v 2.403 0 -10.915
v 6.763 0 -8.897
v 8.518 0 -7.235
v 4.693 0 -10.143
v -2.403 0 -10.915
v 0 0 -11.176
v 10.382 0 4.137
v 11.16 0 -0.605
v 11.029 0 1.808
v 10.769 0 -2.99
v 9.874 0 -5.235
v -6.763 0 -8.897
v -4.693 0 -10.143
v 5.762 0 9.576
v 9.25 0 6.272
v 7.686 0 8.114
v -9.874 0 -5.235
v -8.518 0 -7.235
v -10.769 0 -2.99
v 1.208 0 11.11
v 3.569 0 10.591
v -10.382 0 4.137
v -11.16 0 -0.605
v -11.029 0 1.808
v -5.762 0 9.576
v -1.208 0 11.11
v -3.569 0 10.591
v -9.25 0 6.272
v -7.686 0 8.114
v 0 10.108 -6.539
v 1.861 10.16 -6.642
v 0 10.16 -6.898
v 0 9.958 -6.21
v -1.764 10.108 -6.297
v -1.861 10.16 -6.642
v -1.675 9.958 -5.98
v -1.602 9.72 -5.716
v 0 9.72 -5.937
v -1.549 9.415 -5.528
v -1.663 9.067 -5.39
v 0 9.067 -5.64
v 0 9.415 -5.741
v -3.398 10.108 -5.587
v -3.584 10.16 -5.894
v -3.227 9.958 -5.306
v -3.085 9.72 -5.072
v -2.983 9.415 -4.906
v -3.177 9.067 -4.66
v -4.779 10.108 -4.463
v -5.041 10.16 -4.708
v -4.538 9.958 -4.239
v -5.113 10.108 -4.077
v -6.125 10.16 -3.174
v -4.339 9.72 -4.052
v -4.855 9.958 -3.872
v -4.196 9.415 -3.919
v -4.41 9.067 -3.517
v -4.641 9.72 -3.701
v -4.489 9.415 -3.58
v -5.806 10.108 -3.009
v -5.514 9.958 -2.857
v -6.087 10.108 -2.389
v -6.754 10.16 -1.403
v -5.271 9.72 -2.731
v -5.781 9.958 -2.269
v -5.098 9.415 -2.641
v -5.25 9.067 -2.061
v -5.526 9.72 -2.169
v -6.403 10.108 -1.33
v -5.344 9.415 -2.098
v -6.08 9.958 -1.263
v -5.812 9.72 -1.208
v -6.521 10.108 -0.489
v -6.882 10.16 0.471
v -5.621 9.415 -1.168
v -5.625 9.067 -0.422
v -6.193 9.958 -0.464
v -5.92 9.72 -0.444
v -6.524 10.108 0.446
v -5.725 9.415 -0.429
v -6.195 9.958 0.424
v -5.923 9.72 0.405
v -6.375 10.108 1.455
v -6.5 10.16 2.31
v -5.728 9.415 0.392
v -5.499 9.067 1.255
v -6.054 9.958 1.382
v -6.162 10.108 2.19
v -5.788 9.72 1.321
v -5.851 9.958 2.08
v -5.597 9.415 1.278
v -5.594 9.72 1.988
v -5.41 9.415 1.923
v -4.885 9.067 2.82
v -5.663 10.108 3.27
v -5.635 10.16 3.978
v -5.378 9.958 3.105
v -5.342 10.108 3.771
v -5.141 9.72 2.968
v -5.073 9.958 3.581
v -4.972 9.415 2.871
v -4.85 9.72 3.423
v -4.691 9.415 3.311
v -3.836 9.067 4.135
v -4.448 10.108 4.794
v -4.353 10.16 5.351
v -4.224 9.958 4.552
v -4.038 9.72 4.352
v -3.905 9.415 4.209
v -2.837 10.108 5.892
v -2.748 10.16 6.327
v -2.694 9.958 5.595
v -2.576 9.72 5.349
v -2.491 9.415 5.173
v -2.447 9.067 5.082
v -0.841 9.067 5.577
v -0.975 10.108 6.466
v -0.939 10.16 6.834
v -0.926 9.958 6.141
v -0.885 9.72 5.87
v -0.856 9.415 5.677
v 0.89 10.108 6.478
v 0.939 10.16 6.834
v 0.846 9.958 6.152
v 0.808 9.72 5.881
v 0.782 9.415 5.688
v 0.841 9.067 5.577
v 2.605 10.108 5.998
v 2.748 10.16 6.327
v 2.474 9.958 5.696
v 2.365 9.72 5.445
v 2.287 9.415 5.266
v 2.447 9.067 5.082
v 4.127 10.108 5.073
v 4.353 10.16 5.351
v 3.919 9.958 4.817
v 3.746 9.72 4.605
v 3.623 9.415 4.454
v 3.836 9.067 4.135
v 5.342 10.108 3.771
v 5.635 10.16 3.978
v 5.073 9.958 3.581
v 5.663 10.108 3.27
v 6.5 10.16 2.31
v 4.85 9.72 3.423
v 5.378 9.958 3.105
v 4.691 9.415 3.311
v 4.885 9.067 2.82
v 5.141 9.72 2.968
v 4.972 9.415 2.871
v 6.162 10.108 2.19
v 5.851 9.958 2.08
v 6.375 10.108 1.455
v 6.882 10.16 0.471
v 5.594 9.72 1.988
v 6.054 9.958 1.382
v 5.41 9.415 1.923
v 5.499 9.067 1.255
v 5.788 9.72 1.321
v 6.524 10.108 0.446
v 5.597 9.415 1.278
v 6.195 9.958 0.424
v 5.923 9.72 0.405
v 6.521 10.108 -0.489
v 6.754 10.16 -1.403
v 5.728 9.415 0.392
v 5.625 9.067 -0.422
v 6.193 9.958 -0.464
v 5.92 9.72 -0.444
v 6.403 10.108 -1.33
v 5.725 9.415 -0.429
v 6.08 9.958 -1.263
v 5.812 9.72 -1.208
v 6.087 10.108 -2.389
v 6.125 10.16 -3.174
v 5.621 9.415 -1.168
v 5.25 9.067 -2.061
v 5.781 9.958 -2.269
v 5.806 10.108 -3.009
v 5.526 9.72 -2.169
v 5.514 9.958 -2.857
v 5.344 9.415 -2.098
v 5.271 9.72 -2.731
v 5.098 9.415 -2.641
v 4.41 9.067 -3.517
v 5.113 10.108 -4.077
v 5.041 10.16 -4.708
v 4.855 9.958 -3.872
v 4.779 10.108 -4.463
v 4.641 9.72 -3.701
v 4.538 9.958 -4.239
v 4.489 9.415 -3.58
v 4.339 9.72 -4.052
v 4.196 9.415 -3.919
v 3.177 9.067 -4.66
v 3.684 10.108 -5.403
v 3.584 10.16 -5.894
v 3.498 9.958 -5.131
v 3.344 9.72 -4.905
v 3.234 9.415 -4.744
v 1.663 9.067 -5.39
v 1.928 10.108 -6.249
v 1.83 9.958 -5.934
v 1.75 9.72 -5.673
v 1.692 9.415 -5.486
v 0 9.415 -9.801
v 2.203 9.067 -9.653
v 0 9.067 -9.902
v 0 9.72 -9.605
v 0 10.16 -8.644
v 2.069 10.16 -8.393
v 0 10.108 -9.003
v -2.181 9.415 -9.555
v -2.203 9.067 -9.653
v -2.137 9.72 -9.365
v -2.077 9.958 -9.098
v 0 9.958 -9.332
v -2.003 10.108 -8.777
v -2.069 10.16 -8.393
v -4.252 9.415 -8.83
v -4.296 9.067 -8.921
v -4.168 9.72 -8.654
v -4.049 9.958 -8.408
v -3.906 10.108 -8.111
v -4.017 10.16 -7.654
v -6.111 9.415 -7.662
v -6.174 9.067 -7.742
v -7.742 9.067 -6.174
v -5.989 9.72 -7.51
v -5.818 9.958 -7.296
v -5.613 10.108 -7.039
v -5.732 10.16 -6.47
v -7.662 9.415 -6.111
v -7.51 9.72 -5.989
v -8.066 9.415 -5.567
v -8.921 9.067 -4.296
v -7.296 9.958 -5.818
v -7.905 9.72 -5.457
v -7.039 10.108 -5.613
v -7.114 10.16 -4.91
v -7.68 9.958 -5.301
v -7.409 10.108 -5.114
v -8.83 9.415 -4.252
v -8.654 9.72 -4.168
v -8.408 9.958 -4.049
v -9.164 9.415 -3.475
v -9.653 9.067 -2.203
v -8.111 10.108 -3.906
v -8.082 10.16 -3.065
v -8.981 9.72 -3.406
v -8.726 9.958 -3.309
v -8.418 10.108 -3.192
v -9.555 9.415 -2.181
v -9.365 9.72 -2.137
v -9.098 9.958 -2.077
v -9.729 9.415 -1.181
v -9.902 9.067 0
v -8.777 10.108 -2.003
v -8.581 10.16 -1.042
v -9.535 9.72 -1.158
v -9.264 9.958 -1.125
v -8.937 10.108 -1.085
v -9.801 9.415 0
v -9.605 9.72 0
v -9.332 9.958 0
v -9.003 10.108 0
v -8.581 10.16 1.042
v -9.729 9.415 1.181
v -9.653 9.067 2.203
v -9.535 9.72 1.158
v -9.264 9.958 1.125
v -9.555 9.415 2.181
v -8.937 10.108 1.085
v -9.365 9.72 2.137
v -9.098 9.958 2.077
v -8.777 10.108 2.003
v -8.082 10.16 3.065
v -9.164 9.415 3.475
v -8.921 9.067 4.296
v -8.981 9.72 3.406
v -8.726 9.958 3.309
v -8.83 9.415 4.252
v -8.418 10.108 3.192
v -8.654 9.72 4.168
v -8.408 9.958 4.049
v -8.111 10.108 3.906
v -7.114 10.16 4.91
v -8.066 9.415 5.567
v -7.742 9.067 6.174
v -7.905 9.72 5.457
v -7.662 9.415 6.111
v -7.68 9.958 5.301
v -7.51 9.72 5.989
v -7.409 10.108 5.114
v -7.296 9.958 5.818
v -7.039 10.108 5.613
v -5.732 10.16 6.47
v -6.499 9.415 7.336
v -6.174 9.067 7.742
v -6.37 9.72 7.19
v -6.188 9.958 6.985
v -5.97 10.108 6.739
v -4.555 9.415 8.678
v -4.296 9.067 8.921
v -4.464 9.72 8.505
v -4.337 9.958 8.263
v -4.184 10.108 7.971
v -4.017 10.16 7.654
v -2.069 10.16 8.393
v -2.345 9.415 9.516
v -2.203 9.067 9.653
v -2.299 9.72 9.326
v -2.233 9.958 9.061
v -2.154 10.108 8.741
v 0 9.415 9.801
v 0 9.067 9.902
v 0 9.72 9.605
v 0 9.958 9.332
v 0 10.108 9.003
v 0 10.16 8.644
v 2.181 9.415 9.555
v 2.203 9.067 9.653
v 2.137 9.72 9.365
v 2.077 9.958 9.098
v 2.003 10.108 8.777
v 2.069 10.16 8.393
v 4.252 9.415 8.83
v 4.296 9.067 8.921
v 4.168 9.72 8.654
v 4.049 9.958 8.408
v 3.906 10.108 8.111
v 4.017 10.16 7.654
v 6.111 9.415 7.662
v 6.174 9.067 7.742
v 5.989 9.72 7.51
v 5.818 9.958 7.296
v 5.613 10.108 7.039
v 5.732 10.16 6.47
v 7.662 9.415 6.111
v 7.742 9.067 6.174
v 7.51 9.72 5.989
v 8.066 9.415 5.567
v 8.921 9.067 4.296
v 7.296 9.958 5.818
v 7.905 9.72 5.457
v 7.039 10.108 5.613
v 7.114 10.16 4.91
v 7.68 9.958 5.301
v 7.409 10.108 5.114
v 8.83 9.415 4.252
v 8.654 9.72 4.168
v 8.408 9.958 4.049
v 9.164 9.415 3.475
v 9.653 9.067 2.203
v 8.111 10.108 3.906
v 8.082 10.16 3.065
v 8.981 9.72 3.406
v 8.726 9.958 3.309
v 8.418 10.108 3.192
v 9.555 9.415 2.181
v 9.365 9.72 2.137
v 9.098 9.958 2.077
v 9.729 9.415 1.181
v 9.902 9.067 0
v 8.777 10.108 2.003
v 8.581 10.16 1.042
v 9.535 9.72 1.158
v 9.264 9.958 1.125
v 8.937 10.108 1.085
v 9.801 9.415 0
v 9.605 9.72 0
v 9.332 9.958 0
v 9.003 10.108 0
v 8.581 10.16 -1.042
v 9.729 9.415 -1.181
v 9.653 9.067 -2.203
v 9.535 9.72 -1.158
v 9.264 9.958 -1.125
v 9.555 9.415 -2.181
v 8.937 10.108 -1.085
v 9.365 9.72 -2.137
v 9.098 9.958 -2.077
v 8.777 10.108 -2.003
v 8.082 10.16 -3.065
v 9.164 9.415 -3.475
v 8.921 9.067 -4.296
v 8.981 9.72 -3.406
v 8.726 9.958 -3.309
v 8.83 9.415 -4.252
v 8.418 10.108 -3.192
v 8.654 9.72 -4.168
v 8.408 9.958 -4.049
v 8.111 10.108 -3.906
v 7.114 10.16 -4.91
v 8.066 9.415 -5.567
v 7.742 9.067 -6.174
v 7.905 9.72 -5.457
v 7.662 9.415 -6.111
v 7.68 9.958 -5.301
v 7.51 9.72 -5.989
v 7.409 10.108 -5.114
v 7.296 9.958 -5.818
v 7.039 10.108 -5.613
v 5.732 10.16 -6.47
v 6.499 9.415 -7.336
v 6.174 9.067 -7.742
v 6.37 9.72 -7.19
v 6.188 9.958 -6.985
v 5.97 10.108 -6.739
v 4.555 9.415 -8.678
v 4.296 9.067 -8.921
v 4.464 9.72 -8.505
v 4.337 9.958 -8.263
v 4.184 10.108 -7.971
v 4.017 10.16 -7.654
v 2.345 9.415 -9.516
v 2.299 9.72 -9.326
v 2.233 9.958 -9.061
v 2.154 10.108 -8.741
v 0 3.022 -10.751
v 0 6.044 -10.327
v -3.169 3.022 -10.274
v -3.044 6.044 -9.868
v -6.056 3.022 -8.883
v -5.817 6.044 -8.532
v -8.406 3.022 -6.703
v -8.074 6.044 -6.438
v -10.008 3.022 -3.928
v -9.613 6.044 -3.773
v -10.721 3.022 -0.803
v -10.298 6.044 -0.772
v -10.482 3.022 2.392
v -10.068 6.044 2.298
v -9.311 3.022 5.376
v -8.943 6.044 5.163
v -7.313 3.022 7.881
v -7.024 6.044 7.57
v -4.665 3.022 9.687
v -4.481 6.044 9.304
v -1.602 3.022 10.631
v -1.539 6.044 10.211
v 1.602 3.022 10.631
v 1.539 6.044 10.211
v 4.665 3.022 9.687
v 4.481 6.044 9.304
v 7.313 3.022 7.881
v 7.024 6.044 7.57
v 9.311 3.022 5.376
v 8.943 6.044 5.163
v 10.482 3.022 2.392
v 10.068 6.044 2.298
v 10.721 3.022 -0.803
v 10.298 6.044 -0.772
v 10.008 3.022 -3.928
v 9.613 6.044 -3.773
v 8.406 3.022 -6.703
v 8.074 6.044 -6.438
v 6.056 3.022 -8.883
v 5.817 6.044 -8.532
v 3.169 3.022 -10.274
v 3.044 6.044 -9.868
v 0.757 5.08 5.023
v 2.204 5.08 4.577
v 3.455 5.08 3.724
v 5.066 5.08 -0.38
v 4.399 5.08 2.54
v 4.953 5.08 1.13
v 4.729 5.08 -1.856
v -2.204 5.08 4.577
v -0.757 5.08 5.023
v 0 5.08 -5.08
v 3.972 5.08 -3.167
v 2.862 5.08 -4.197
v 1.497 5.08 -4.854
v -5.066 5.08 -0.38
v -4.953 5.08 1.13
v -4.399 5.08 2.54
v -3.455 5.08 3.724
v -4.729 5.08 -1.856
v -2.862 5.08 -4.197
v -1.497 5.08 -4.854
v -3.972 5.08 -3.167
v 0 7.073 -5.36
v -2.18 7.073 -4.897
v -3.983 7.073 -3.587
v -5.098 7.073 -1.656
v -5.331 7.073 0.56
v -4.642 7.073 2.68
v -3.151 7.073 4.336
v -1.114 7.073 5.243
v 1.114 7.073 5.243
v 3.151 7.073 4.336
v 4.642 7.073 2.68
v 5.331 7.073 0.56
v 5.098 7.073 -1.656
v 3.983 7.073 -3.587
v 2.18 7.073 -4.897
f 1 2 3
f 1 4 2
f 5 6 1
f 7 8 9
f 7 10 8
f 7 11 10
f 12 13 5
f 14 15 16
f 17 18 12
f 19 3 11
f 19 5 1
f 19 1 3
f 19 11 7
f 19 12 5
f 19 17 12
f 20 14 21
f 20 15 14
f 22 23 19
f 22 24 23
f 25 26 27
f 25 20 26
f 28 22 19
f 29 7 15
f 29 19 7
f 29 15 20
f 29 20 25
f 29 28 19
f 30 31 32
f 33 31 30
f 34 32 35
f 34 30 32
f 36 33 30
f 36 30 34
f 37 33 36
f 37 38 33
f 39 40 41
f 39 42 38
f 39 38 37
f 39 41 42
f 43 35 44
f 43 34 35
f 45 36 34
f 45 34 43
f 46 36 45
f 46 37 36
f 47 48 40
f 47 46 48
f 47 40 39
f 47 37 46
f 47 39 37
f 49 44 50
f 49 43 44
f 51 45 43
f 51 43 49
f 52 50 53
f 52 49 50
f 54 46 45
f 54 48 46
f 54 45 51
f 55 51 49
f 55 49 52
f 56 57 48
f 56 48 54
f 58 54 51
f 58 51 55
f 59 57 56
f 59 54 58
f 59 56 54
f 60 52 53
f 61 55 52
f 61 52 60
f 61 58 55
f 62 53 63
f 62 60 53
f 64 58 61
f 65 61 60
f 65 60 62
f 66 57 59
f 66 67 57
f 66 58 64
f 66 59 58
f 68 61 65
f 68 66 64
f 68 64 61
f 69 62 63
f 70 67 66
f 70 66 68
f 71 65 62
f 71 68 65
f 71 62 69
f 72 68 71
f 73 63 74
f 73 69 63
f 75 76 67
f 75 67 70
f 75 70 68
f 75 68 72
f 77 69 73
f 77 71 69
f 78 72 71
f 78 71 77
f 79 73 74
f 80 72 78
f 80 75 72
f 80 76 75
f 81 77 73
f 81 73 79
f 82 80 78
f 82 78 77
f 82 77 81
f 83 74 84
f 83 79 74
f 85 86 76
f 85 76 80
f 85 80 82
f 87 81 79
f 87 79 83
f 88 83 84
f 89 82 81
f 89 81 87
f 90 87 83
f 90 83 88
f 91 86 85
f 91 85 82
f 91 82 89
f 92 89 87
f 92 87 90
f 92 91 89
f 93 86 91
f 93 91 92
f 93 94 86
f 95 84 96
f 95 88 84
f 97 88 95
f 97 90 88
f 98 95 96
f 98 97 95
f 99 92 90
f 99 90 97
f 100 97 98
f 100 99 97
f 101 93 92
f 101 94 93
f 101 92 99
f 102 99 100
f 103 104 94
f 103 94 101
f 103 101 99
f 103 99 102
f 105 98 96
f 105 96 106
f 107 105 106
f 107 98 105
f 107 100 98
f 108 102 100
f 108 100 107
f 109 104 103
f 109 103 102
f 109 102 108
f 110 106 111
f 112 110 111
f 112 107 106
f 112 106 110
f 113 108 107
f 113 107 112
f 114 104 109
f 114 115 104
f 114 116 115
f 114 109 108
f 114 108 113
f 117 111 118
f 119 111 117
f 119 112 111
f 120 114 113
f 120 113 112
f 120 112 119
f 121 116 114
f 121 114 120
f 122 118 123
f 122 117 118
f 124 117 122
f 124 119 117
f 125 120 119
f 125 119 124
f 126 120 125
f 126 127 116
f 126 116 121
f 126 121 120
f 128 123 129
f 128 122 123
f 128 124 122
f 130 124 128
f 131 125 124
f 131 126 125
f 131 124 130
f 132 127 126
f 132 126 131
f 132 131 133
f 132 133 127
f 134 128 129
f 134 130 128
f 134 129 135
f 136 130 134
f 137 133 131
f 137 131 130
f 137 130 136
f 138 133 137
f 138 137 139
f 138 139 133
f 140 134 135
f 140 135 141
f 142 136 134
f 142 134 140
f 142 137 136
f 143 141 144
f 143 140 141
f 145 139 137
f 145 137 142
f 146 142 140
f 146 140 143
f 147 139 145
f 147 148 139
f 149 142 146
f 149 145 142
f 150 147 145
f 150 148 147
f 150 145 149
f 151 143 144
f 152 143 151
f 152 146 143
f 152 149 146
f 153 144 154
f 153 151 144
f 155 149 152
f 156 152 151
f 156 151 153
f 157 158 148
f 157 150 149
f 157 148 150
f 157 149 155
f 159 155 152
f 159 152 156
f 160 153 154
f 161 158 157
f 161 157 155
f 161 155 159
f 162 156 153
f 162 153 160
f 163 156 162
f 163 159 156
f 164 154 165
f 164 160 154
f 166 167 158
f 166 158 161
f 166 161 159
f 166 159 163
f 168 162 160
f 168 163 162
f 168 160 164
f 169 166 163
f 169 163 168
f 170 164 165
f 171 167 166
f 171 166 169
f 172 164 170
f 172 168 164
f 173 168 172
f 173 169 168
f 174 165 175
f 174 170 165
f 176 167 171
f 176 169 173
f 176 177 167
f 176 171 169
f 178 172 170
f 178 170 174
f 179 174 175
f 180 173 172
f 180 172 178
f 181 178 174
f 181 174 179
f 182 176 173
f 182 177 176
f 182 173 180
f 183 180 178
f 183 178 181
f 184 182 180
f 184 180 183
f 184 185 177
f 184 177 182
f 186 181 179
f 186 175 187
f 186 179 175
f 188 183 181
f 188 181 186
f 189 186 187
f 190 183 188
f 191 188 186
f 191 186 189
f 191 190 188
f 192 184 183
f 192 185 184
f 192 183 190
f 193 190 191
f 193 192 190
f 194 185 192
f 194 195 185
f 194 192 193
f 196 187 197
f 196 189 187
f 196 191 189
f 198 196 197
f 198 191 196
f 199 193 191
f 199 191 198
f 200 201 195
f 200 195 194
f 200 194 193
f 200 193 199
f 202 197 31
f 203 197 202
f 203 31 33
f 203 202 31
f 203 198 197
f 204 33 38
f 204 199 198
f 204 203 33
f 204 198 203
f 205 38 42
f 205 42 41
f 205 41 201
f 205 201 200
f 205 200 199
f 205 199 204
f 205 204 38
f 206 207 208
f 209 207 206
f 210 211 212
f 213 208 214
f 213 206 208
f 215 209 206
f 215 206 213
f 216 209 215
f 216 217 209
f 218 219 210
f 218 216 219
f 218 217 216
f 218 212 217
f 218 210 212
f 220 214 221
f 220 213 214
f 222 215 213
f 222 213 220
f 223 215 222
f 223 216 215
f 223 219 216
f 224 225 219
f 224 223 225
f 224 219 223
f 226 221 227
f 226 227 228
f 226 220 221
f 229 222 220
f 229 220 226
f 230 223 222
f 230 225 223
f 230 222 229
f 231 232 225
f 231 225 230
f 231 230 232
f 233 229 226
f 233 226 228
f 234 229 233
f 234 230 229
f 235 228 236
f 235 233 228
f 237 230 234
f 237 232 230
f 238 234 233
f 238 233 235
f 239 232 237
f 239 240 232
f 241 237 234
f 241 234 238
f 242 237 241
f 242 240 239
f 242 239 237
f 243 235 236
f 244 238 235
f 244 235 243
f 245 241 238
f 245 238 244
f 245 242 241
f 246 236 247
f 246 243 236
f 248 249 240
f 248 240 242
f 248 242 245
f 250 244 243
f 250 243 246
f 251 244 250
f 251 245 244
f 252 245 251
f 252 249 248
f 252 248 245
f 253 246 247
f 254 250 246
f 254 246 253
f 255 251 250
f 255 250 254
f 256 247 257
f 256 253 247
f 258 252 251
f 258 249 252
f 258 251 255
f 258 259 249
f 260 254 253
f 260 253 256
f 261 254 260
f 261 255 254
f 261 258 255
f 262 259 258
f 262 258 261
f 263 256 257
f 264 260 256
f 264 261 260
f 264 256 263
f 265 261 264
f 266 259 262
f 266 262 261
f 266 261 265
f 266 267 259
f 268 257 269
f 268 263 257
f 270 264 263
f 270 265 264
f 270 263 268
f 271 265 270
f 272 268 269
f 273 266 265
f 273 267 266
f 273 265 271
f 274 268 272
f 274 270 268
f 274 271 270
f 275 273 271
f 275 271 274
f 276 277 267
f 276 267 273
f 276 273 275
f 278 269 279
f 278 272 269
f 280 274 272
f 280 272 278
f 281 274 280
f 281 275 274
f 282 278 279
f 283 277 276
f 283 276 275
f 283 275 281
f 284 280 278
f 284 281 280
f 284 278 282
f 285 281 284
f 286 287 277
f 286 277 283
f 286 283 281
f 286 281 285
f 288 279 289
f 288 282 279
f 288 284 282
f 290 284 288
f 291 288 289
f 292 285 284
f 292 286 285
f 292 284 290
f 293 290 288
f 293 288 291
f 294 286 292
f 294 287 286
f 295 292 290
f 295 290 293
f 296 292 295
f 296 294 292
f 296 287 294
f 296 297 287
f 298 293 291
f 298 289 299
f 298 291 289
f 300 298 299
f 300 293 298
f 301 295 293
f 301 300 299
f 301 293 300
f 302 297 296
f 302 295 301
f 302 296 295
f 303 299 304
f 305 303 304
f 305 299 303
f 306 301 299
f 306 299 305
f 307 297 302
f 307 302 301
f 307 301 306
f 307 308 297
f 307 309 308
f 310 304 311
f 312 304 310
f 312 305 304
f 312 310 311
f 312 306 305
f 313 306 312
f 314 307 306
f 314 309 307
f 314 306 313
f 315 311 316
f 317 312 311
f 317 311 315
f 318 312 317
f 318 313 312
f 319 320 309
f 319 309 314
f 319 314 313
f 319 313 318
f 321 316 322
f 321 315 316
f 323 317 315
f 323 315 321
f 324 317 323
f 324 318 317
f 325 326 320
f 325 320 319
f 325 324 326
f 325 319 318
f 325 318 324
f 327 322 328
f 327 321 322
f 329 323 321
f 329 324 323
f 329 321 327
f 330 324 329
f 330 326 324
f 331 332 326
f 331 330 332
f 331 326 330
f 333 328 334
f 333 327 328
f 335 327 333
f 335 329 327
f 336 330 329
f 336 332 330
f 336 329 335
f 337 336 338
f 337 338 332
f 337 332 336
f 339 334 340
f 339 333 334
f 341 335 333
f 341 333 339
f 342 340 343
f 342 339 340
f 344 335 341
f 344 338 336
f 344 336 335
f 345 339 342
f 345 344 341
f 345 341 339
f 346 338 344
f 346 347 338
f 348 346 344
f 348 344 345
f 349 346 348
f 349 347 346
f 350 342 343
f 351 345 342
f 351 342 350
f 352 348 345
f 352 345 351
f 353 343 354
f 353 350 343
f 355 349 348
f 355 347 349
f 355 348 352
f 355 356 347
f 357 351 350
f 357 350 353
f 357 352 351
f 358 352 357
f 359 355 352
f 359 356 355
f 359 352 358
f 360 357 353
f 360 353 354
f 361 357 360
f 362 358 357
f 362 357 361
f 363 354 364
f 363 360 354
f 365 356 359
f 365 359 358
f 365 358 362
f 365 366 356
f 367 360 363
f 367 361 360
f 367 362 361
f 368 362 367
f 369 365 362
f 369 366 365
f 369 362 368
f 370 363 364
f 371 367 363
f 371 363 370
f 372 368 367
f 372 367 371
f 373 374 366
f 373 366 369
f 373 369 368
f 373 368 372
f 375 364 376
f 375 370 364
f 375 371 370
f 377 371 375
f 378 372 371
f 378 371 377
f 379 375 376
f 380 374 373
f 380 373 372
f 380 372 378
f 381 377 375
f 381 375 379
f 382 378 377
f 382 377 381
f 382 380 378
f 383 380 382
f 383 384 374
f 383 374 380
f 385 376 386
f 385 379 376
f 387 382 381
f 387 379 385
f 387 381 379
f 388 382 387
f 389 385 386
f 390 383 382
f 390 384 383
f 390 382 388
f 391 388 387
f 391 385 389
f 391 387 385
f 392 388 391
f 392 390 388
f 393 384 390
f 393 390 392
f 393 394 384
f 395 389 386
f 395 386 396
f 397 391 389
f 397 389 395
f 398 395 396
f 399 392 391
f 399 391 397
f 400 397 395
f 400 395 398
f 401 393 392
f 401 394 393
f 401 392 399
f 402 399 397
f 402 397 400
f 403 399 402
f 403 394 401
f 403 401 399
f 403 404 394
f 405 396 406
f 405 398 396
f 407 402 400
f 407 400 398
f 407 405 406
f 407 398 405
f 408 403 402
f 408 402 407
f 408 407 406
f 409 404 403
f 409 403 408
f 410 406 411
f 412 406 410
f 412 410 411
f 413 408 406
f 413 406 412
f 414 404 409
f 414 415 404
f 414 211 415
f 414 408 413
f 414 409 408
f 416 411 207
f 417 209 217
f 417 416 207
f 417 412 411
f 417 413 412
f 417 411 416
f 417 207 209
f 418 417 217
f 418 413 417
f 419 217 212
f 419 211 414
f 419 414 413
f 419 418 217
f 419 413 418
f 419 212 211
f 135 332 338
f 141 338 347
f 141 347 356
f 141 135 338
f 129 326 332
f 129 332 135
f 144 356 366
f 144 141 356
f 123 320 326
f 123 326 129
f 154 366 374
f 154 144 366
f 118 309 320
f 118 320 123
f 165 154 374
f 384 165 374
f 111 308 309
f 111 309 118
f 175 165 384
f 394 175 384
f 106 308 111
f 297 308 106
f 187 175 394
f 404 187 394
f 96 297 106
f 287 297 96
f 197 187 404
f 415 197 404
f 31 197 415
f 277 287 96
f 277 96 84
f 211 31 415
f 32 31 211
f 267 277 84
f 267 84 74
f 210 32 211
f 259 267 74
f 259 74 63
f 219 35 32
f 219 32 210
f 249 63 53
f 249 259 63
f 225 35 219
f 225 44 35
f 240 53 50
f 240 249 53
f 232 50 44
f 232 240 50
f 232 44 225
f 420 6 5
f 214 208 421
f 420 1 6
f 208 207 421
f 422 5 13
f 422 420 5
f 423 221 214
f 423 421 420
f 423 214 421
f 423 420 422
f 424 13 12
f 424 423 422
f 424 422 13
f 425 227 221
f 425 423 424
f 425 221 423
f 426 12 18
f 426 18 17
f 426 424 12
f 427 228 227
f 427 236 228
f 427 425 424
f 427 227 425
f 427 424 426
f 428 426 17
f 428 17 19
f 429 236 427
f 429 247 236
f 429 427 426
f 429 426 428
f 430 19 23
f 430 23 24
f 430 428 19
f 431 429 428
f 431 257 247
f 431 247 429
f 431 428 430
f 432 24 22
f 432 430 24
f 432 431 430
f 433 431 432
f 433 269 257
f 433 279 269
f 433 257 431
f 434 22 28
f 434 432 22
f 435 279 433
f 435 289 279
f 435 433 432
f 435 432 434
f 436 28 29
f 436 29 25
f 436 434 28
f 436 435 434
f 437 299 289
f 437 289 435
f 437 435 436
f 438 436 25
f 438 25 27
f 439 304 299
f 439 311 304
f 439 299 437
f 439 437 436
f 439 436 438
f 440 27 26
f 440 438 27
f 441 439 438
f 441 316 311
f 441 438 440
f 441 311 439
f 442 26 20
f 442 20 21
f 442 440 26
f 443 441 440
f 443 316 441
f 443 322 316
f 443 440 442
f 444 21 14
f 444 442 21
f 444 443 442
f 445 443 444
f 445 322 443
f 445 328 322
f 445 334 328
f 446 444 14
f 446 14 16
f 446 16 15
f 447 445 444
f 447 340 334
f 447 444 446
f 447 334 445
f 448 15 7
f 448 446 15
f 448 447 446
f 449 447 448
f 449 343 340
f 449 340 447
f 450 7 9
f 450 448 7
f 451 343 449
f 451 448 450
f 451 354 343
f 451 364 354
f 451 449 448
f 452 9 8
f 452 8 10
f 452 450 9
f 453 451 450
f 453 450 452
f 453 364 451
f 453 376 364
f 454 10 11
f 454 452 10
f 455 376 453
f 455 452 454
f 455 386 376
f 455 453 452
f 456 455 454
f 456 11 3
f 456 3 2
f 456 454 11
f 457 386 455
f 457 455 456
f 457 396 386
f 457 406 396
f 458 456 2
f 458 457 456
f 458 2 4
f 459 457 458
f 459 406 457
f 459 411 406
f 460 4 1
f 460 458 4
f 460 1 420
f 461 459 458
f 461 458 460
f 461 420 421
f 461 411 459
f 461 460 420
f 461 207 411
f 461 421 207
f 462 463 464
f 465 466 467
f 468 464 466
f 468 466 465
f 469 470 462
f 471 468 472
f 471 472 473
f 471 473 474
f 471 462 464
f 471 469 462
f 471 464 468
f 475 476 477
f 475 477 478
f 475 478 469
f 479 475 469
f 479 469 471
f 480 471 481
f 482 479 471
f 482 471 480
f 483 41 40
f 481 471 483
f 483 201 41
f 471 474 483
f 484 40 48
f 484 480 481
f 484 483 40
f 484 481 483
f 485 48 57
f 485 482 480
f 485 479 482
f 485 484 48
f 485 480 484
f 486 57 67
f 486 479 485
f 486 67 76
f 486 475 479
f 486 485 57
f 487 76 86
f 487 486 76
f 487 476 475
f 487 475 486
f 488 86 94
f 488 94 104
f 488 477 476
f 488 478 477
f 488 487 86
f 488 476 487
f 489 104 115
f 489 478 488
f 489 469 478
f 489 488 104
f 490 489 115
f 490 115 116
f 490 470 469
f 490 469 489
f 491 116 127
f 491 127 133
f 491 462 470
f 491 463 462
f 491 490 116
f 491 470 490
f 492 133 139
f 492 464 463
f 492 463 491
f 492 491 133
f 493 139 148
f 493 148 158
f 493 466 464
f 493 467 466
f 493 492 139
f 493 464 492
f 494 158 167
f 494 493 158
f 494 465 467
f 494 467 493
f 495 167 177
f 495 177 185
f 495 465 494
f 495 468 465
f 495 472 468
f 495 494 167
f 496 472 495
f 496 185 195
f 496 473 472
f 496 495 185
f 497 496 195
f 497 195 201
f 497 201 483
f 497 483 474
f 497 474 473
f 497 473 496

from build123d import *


with BuildPart() as part:
    # Sketch1 → Revolve1 (revolve)
    with BuildSketch(Plane(origin=(0, 0, 0), x_dir=(0, 0, -1), z_dir=(1, 0, 0))):
        with BuildLine():
            Line((0, 0), (11.176, 0))
            Line((11.176, 0), (9.90175141, 9.066749838))
            ThreePointArc((9.90175141, 9.066749838), (9.477305929, 9.848481167), (8.644110962, 10.16))
            Line((8.644110962, 10.16), (6.897941597, 10.16))
            ThreePointArc((6.897941597, 10.16), (6.06474663, 9.848481167), (5.64030115, 9.066749838))
            Line((5.64030115, 9.066749838), (5.08, 5.08))
            Line((5.08, 5.08), (0, 5.08))
            Line((0, 5.08), (0, 0))
        make_face()
    revolve(axis=Axis((0, 0, 0), (0, 1, 0)))


solid = part.part
